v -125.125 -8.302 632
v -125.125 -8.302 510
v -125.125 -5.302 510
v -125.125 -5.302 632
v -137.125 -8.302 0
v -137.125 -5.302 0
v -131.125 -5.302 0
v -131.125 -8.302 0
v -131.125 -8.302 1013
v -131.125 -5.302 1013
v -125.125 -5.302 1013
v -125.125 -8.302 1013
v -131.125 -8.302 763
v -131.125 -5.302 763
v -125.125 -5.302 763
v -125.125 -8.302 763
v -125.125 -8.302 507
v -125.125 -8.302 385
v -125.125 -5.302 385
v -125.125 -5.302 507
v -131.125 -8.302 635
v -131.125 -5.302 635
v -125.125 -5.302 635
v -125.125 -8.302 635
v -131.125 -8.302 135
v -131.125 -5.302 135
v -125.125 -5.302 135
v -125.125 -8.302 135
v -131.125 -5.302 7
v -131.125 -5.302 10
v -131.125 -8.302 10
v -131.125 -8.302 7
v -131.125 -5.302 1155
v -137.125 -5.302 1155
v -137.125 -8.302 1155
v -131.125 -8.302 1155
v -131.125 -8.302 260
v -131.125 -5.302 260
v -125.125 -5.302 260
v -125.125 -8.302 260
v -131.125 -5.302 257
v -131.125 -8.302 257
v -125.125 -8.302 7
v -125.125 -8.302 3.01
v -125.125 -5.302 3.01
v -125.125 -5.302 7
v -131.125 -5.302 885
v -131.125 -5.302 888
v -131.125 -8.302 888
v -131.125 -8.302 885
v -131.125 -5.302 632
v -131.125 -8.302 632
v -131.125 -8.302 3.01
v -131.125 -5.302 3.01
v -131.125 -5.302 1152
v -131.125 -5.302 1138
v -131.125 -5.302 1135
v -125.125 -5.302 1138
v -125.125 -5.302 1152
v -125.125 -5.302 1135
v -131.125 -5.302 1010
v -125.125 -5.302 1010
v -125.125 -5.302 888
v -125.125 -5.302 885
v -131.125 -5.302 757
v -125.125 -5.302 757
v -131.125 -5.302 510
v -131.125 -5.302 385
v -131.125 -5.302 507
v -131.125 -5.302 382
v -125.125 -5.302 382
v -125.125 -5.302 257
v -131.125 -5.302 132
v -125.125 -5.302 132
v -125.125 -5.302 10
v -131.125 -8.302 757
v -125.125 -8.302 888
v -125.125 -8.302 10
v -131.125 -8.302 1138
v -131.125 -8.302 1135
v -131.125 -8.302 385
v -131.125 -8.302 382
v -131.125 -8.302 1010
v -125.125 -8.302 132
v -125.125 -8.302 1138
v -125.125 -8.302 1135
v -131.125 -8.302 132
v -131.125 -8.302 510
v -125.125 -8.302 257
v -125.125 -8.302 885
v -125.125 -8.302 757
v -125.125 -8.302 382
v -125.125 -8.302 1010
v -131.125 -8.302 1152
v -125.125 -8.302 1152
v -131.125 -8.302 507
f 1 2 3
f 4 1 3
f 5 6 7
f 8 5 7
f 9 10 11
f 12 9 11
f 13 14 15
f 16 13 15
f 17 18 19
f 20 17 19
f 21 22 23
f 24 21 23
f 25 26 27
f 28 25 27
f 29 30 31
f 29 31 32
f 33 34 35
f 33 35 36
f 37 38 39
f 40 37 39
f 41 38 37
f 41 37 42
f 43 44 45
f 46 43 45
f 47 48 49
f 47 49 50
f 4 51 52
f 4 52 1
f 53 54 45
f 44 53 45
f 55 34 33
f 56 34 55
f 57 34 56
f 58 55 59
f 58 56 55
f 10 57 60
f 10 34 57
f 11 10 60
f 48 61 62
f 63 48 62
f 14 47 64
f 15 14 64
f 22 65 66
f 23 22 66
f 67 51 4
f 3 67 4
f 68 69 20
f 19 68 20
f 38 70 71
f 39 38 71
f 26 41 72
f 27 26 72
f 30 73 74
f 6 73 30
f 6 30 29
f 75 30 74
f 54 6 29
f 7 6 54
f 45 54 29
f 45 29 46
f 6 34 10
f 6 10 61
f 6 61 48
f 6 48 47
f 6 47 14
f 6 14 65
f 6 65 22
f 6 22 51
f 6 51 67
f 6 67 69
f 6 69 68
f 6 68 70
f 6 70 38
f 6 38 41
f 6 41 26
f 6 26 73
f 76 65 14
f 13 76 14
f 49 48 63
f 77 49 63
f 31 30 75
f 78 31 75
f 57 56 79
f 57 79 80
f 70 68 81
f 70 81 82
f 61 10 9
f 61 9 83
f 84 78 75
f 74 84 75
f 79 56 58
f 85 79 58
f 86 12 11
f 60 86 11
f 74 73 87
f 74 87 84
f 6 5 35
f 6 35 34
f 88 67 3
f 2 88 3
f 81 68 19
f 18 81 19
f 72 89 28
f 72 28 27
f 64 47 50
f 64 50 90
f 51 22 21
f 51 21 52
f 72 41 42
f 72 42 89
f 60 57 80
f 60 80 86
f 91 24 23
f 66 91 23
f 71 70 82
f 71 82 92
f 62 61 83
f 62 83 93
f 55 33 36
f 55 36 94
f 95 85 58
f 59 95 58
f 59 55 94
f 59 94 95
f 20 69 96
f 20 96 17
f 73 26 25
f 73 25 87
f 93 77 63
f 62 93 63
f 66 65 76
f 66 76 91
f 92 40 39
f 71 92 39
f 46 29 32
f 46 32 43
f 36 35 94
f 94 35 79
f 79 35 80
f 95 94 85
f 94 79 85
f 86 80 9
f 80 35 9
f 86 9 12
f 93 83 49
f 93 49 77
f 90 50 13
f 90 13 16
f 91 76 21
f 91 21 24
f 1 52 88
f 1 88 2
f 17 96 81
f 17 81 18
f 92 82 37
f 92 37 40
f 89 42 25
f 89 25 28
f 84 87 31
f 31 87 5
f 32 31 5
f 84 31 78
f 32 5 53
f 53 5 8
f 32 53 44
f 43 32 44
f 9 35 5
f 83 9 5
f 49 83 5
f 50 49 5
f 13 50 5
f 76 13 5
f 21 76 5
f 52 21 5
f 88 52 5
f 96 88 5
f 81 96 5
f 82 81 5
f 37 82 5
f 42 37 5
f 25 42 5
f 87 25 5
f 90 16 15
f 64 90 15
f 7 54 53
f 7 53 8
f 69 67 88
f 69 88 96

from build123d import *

# Parameters (mm, degrees)
SKETCH_1_W          = 12
SKETCH_1_H          = 3
EXTRUDE_1_DEPTH     = 1155
SKETCH_3_W          = 6
SKETCH_3_H          = 3.01
SKETCH_3_H_2        = 3
CUT_EXTRUDE_1_DEPTH = 1164.115381597


with BuildPart() as part:
    # 草图1 → 凸台-拉伸1 (new body)
    with BuildSketch(Plane.XY):
        with Locations((-131.125456821, -6.801880905)):
            Rectangle(SKETCH_1_W, SKETCH_1_H)
    extrude(amount=EXTRUDE_1_DEPTH)

    # 草图3 → 切除-拉伸1 (cut, through all)
    with BuildSketch(Plane(origin=(0, -5.301880905, 0), x_dir=(1, 0, 0), z_dir=(0, 1, 0))):
        with Locations((-128.125456821, -1.505)):
            Rectangle(SKETCH_3_W, SKETCH_3_H)
        with Locations((-128.125456821, -8.5)):
            Rectangle(SKETCH_3_W, SKETCH_3_H_2)
        with Locations((-128.125456821, -133.5)):
            Rectangle(SKETCH_3_W, SKETCH_3_H_2)
        with Locations((-128.125456821, -258.5)):
            Rectangle(SKETCH_3_W, SKETCH_3_H_2)
        with Locations((-128.125456821, -383.5)):
            Rectangle(SKETCH_3_W, SKETCH_3_H_2)
        with Locations((-128.125456821, -508.5)):
            Rectangle(SKETCH_3_W, SKETCH_3_H_2)
        with Locations((-128.125456821, -633.5)):
            Rectangle(SKETCH_3_W, SKETCH_3_H_2)
        with Locations((-128.125456821, -758.5)):
            Rectangle(SKETCH_3_W, SKETCH_3_H_2)
        with Locations((-128.125456821, -761.5)):
            Rectangle(SKETCH_3_W, SKETCH_3_H_2)
        with Locations((-128.125456821, -886.5)):
            Rectangle(SKETCH_3_W, SKETCH_3_H_2)
        with Locations((-128.125456821, -1011.5)):
            Rectangle(SKETCH_3_W, SKETCH_3_H_2)
        with Locations((-128.125456821, -1136.5)):
            Rectangle(SKETCH_3_W, SKETCH_3_H_2)
        with Locations((-128.125456821, -1153.5)):
            Rectangle(SKETCH_3_W, SKETCH_3_H_2)
    extrude(amount=-CUT_EXTRUDE_1_DEPTH, mode=Mode.SUBTRACT)


solid = part.part
